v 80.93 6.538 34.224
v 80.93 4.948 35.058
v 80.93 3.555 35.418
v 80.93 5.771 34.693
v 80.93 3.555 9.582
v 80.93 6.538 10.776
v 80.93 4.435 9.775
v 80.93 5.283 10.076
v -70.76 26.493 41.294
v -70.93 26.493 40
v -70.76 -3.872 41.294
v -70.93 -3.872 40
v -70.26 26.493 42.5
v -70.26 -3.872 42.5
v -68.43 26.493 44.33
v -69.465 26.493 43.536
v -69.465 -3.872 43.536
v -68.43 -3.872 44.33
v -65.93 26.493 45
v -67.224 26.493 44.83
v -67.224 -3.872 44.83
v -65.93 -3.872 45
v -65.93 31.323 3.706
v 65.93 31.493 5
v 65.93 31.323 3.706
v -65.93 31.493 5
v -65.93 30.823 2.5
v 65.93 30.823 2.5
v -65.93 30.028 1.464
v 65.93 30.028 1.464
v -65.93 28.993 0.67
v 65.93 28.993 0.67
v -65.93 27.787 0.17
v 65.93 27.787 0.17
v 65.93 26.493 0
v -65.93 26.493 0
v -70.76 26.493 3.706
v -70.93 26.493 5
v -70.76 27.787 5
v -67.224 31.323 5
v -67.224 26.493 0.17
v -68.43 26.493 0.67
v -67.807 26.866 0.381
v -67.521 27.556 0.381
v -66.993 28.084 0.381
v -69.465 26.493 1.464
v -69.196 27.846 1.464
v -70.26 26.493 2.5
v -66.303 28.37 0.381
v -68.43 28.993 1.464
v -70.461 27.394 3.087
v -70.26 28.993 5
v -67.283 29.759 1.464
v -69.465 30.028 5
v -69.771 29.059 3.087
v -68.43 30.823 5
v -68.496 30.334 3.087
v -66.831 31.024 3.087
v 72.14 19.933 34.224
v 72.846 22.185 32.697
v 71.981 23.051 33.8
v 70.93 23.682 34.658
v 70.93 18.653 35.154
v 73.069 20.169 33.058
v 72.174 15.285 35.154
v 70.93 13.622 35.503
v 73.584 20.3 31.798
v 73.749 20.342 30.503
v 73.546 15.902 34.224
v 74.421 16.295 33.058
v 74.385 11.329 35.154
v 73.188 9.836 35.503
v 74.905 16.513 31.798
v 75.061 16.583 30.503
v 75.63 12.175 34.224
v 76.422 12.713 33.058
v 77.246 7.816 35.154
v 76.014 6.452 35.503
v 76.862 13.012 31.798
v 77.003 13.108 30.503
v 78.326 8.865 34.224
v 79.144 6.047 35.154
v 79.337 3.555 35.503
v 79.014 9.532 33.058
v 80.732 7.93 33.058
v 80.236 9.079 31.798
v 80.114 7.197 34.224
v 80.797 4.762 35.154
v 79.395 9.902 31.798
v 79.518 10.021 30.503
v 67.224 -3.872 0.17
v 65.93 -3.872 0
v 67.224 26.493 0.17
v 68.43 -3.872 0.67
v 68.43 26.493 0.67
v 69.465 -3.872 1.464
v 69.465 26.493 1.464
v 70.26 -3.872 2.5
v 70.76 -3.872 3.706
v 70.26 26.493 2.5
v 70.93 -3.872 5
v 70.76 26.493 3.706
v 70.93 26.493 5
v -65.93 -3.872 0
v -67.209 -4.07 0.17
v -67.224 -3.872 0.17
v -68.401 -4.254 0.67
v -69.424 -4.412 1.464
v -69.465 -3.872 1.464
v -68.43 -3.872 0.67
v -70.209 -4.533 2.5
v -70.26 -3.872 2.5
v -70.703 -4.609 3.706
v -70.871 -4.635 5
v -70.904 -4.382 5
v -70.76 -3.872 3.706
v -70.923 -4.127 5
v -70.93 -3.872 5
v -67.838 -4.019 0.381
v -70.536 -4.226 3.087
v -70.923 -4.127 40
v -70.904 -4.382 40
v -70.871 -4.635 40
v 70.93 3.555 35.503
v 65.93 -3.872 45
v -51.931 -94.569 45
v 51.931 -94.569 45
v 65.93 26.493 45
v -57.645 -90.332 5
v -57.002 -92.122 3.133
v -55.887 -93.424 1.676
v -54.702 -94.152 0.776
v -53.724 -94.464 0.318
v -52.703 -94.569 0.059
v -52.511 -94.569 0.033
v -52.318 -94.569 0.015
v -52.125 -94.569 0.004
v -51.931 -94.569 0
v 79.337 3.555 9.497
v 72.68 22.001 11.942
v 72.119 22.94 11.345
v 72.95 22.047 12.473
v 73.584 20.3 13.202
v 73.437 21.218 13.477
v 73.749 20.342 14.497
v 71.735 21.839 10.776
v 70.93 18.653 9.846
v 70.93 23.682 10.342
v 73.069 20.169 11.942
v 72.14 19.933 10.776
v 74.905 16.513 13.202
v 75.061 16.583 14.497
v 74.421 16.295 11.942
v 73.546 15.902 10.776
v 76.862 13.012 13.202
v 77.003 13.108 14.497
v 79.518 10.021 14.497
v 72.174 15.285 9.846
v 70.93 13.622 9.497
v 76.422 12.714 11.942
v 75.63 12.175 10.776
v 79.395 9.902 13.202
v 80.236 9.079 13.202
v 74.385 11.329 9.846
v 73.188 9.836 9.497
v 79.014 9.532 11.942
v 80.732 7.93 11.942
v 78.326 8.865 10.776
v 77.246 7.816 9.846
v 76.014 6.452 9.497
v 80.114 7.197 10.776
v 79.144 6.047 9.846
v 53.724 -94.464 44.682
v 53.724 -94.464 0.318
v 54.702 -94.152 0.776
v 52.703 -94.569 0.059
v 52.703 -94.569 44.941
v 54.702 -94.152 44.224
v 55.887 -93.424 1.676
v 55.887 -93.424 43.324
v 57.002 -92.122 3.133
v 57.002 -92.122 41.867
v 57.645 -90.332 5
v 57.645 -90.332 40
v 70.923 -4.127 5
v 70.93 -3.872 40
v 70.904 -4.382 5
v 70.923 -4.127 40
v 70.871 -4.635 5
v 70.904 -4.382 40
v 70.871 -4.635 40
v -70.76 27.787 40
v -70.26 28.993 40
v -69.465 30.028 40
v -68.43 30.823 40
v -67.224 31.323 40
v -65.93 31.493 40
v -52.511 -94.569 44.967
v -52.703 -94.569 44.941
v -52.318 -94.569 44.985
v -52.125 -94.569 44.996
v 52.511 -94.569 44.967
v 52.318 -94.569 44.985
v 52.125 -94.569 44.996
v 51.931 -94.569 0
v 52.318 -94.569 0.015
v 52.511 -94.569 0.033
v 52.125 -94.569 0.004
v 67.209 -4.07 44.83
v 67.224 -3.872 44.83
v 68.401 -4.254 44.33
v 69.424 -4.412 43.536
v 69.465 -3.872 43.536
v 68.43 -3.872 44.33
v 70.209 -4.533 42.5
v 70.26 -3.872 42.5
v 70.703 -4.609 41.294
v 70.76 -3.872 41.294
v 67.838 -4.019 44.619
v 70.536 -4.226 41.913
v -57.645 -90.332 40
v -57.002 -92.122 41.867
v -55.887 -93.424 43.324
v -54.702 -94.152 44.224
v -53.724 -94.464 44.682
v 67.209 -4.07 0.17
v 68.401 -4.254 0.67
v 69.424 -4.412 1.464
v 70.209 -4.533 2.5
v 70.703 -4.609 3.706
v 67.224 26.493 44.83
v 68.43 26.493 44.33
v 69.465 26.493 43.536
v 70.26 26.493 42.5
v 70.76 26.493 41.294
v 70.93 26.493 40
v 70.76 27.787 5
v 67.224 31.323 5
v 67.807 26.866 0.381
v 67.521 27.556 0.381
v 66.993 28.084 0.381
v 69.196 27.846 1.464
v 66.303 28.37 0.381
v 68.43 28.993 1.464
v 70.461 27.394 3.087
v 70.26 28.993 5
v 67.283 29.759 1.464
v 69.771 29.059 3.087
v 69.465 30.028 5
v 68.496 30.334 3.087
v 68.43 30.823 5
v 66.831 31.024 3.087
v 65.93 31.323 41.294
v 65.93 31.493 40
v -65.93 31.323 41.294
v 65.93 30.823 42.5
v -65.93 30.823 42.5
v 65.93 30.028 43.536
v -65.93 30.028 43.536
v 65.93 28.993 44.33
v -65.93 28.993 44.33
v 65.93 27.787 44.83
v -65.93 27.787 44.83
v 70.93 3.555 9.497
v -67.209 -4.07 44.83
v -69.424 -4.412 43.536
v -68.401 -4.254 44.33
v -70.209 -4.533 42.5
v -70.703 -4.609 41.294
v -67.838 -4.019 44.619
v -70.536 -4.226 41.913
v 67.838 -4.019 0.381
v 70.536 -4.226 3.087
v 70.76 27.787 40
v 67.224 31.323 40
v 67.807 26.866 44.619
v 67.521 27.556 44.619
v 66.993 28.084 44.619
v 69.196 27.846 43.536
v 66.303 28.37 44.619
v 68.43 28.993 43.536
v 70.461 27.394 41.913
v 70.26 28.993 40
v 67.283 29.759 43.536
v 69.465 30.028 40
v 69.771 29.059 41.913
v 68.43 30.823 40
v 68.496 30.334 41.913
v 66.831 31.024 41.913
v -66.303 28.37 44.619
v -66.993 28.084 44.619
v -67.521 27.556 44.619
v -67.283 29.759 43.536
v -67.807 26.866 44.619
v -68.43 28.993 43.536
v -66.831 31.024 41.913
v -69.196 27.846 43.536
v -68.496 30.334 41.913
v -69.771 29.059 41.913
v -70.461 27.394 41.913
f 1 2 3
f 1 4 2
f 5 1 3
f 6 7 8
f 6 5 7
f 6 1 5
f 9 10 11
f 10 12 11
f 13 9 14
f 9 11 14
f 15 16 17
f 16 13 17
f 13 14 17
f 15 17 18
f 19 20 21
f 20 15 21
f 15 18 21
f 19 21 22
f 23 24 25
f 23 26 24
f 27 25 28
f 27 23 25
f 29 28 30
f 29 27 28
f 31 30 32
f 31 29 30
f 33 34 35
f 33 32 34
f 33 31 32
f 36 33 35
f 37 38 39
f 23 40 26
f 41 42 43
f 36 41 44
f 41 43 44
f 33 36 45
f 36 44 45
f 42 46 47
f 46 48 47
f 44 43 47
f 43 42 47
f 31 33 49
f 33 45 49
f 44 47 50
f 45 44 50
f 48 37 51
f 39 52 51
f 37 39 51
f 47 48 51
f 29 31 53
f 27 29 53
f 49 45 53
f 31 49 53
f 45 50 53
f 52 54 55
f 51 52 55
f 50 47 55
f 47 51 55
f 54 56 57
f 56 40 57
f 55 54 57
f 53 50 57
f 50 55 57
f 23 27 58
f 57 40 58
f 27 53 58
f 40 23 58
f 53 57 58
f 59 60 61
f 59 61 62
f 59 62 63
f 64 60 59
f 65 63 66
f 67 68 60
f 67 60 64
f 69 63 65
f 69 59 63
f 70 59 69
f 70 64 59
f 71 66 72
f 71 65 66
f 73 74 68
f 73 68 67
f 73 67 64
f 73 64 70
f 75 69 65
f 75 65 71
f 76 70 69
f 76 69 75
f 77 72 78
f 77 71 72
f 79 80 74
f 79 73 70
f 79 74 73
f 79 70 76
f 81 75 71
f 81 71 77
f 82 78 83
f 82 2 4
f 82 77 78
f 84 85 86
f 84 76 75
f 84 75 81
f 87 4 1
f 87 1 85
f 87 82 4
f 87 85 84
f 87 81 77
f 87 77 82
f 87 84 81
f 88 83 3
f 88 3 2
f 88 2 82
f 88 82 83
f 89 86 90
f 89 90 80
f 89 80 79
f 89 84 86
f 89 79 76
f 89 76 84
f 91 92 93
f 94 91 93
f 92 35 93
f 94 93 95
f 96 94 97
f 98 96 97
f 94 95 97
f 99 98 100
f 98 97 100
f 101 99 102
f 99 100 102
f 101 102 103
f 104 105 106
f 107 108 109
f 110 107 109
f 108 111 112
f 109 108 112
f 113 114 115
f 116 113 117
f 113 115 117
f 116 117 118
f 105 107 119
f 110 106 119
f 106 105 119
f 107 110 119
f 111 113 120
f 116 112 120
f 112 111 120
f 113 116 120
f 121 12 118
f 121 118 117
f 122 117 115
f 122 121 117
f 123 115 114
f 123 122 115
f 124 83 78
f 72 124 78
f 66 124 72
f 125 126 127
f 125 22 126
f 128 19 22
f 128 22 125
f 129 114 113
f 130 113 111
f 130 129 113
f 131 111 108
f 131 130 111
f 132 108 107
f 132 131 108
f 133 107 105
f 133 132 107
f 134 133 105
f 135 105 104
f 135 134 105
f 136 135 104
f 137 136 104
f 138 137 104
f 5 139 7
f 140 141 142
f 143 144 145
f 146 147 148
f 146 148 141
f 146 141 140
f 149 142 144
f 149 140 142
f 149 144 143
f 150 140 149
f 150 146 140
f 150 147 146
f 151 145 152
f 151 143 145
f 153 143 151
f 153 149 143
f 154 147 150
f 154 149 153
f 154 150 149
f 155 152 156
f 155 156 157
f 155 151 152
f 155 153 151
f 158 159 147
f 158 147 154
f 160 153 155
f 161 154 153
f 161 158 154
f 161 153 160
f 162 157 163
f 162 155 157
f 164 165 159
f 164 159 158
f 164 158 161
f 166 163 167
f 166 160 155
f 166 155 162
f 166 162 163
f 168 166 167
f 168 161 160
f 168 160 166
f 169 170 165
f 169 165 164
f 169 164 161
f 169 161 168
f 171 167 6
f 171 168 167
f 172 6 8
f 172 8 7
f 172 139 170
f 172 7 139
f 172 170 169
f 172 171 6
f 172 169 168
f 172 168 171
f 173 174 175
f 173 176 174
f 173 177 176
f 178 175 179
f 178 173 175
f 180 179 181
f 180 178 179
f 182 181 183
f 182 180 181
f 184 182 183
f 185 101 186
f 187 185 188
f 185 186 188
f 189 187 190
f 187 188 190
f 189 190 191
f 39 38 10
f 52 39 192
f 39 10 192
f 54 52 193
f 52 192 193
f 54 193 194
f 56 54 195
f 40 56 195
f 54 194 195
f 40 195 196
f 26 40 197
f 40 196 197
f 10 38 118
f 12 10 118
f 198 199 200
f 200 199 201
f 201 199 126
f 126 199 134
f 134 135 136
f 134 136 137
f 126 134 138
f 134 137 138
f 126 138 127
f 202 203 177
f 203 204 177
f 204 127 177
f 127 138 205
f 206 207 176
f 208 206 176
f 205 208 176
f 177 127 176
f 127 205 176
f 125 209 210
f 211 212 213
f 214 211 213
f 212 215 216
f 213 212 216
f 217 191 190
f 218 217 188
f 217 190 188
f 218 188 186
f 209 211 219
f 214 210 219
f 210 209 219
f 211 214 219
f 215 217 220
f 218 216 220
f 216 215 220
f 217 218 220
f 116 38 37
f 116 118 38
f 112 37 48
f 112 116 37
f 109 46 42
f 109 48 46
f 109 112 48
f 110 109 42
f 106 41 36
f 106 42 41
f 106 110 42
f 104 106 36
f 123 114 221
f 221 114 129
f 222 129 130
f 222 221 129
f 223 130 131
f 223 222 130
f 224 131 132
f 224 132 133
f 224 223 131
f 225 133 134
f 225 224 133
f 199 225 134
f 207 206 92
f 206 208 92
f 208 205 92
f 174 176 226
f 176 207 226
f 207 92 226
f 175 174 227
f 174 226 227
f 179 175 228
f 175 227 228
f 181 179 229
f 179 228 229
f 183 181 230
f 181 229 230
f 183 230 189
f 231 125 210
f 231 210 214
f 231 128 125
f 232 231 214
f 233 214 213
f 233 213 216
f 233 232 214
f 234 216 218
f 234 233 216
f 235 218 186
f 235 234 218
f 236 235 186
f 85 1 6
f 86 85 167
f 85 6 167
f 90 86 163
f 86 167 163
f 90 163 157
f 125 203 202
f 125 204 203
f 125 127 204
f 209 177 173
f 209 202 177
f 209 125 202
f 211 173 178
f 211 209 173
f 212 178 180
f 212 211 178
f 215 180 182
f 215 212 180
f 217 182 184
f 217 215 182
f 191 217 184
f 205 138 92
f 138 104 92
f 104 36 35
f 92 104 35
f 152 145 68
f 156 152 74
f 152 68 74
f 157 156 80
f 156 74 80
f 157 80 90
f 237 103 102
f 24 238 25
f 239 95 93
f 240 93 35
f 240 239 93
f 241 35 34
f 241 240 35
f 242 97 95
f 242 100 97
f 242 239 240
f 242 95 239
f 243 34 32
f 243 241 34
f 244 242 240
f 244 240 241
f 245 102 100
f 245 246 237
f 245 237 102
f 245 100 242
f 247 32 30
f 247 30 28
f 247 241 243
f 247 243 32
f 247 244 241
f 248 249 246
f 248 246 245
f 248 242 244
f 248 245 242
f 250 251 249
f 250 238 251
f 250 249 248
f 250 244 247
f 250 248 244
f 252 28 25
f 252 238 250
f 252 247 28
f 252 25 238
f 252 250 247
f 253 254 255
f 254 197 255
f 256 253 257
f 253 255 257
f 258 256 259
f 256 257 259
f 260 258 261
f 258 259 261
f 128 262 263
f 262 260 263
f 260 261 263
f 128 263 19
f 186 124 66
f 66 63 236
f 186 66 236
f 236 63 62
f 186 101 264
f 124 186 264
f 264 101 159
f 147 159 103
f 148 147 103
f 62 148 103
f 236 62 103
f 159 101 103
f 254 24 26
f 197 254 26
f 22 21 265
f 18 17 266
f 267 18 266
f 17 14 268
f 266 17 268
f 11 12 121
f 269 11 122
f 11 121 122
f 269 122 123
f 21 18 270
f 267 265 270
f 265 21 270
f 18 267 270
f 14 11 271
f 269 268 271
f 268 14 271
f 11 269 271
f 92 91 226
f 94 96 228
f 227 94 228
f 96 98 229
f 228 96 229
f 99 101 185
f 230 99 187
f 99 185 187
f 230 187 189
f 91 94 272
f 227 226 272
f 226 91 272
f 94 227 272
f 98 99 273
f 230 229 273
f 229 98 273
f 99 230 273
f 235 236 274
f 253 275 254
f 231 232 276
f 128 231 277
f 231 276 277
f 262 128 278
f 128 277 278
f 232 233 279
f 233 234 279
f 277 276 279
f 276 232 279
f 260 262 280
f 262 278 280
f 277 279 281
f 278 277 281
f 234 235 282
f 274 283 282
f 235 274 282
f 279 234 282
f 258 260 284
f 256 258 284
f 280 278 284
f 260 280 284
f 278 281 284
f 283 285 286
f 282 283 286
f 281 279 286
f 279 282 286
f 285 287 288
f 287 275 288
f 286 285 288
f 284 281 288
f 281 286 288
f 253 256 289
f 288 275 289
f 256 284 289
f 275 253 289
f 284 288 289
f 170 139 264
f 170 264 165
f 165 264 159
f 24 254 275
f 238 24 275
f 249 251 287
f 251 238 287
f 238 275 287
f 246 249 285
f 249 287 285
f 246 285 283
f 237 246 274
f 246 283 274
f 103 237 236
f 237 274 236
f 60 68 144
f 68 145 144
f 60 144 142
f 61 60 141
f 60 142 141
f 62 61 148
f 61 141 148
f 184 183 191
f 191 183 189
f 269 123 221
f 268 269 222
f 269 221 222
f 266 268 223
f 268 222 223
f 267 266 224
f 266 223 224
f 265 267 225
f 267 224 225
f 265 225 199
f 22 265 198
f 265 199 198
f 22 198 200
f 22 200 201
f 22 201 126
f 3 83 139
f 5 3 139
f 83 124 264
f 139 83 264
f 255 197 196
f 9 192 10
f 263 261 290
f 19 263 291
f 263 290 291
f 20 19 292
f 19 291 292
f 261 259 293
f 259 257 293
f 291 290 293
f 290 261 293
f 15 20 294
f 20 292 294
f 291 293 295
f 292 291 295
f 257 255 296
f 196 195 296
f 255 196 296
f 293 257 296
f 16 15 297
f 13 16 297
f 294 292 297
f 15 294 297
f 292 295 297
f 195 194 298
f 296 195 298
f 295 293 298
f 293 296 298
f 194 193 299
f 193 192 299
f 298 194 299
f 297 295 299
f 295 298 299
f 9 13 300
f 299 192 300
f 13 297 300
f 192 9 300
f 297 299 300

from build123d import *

# Parameters (mm, degrees)
BOSS_EXTRUDE1_DEPTH = 45
SKETCH2_W           = 26.006189056
SKETCH2_H           = 20.126135809
BOSS_EXTRUDE2_DEPTH = 10
SKETCH3_R           = 22.920226204
CUT_EXTRUDE1_DEPTH  = 33
FILLET1_R           = 5
FILLET2_R           = 5


with BuildPart() as part:
    # Sketch1 → Boss-Extrude1 (new body)
    with BuildSketch(Plane.XY):
        Polygon((-70.929913968, 31.492881802), (-70.929913968, -4.255794838), (-56.990550477, -94.56927522), (56.990550477, -94.56927522), (70.929913968, -4.255794838), (70.929913968, 31.492881802), align=None)
    extrude(amount=BOSS_EXTRUDE1_DEPTH)

    # Sketch2 → Boss-Extrude2 (add)
    with BuildSketch(Plane(origin=(70.929913968, 0, 0), x_dir=(0, 0, -1), z_dir=(1, 0, 0))):
        with Locations((-22.5, 13.618543481)):
            Rectangle(SKETCH2_W, SKETCH2_H)
    extrude(amount=BOSS_EXTRUDE2_DEPTH)

    # Sketch3 → Cut-Extrude1 (cut)
    with BuildSketch(Plane.XY.offset(35.503094528)):
        with Locations((95.963397028, 25.985714872)):
            Circle(SKETCH3_R)
    extrude(amount=-CUT_EXTRUDE1_DEPTH, mode=Mode.SUBTRACT)

    # Fillet1
    fillet1_edges = [part.edges().sort_by_distance(p)[0] for p in [
        (-63.960232222, -49.412535029, 45),
        (70.929913968, 31.492881802, 22.5),
        (70.929913968, -4.255794838, 22.5),
        (56.990550477, -94.56927522, 22.5),
        (-56.990550477, -94.56927522, 22.5),
        (-70.929913968, -4.255794838, 22.5),
        (-70.929913968, 31.492881802, 22.5),
        (63.960232222, -49.412535029, 45),
        (70.929913968, 13.618543482, 45),
        (0, 31.492881802, 45),
        (70.929913968, 13.618543482, 0),
        (63.960232222, -49.412535029, 0),
        (-70.929913968, 13.618543482, 45),
        (-63.960232222, -49.412535029, 0),
        (-70.929913968, 13.618543482, 0),
        (0, 31.492881802, 0),
    ]]
    fillet(fillet1_edges, radius=FILLET1_R)

    # Fillet2
    # the kernel refuses this fillet: 5 mm, written as the material it takes off along each edge
    with BuildSketch(Plane(origin=(80.929913968, 8.684525424, 4.131557715), x_dir=(0, -1, 0), z_dir=(0, 0, 1))) as fillet2_piece_1:
        with BuildLine():
            CenterArc((2.146139103, -5), FILLET2_R, 90, 44.149416871)
            ThreePointArc((-1.336520459, -1.412370925), (-0.653275696, -0.720365262), (0, 0))
            Line((0, 0), (2.146139103, 0))
        make_face()
    extrude(amount=36.736884569, mode=Mode.SUBTRACT)
    with BuildSketch(Plane(origin=(73.159277304, 23.681611386, 1.019055512), x_dir=(-1, 0, 0), z_dir=(0, 0, 1))) as fillet2_piece_2:
        with BuildLine():
            CenterArc((4.256496735, 4.570637831), FILLET2_R, 194.254416025, 51.827716126)
            ThreePointArc((-0.589562939, 3.339497856), (-0.232935215, 1.680667414), (0, 0))
            Line((0, 0), (2.229363336, 0))
        make_face()
    extrude(amount=42.961888977, mode=Mode.SUBTRACT)
    with BuildSketch(Plane(origin=(95.963397028, 25.985714872, 9.496905472), x_dir=(-0.9027297705617247, 0.43020804425484166, 0), z_dir=(0.43020804425484166, 0.9027297705617247, 0))) as fillet2_piece_3_section:
        with BuildLine():
            CenterArc((22.920226204 + FILLET2_R, FILLET2_R), FILLET2_R, 180, 90)
            Line((22.920226204, FILLET2_R), (22.920226204, 0))
            Line((22.920226204, 0), (22.920226204 + FILLET2_R, 0))
        make_face()
    fillet2_piece_3 = revolve(axis=Axis((95.963397028, 25.985714872, 9.496905472), (0, 0, 1)), revolution_arc=105.742769493, mode=Mode.PRIVATE)
    fillet2_piece_3 = split(fillet2_piece_3, bisect_by=Plane(origin=(70.929913968, 25.985714872, 9.496905472), z_dir=(1, 0, 0)), keep=Keep.TOP, mode=Mode.PRIVATE)
    add(fillet2_piece_3, mode=Mode.SUBTRACT)
    with BuildSketch(Plane(origin=(95.963397028, 25.985714872, 35.503094528), x_dir=(-0.9027297705617229, 0.4302080442548457, 0), z_dir=(0.4302080442548457, 0.9027297705617229, 0))) as fillet2_piece_4_section:
        with BuildLine():
            CenterArc((22.920226204 + FILLET2_R, -FILLET2_R), FILLET2_R, 90, 90)
            Line((22.920226204, -FILLET2_R), (22.920226204, 0))
            Line((22.920226204, 0), (22.920226204 + FILLET2_R, 0))
        make_face()
    fillet2_piece_4 = revolve(axis=Axis((95.963397028, 25.985714872, 35.503094528), (0, 0, 1)), revolution_arc=105.742769493, mode=Mode.PRIVATE)
    fillet2_piece_4 = split(fillet2_piece_4, bisect_by=Plane(origin=(70.929913968, 25.985714872, 35.503094528), z_dir=(1, 0, 0)), keep=Keep.TOP, mode=Mode.PRIVATE)
    add(fillet2_piece_4, mode=Mode.SUBTRACT)


solid = part.part
